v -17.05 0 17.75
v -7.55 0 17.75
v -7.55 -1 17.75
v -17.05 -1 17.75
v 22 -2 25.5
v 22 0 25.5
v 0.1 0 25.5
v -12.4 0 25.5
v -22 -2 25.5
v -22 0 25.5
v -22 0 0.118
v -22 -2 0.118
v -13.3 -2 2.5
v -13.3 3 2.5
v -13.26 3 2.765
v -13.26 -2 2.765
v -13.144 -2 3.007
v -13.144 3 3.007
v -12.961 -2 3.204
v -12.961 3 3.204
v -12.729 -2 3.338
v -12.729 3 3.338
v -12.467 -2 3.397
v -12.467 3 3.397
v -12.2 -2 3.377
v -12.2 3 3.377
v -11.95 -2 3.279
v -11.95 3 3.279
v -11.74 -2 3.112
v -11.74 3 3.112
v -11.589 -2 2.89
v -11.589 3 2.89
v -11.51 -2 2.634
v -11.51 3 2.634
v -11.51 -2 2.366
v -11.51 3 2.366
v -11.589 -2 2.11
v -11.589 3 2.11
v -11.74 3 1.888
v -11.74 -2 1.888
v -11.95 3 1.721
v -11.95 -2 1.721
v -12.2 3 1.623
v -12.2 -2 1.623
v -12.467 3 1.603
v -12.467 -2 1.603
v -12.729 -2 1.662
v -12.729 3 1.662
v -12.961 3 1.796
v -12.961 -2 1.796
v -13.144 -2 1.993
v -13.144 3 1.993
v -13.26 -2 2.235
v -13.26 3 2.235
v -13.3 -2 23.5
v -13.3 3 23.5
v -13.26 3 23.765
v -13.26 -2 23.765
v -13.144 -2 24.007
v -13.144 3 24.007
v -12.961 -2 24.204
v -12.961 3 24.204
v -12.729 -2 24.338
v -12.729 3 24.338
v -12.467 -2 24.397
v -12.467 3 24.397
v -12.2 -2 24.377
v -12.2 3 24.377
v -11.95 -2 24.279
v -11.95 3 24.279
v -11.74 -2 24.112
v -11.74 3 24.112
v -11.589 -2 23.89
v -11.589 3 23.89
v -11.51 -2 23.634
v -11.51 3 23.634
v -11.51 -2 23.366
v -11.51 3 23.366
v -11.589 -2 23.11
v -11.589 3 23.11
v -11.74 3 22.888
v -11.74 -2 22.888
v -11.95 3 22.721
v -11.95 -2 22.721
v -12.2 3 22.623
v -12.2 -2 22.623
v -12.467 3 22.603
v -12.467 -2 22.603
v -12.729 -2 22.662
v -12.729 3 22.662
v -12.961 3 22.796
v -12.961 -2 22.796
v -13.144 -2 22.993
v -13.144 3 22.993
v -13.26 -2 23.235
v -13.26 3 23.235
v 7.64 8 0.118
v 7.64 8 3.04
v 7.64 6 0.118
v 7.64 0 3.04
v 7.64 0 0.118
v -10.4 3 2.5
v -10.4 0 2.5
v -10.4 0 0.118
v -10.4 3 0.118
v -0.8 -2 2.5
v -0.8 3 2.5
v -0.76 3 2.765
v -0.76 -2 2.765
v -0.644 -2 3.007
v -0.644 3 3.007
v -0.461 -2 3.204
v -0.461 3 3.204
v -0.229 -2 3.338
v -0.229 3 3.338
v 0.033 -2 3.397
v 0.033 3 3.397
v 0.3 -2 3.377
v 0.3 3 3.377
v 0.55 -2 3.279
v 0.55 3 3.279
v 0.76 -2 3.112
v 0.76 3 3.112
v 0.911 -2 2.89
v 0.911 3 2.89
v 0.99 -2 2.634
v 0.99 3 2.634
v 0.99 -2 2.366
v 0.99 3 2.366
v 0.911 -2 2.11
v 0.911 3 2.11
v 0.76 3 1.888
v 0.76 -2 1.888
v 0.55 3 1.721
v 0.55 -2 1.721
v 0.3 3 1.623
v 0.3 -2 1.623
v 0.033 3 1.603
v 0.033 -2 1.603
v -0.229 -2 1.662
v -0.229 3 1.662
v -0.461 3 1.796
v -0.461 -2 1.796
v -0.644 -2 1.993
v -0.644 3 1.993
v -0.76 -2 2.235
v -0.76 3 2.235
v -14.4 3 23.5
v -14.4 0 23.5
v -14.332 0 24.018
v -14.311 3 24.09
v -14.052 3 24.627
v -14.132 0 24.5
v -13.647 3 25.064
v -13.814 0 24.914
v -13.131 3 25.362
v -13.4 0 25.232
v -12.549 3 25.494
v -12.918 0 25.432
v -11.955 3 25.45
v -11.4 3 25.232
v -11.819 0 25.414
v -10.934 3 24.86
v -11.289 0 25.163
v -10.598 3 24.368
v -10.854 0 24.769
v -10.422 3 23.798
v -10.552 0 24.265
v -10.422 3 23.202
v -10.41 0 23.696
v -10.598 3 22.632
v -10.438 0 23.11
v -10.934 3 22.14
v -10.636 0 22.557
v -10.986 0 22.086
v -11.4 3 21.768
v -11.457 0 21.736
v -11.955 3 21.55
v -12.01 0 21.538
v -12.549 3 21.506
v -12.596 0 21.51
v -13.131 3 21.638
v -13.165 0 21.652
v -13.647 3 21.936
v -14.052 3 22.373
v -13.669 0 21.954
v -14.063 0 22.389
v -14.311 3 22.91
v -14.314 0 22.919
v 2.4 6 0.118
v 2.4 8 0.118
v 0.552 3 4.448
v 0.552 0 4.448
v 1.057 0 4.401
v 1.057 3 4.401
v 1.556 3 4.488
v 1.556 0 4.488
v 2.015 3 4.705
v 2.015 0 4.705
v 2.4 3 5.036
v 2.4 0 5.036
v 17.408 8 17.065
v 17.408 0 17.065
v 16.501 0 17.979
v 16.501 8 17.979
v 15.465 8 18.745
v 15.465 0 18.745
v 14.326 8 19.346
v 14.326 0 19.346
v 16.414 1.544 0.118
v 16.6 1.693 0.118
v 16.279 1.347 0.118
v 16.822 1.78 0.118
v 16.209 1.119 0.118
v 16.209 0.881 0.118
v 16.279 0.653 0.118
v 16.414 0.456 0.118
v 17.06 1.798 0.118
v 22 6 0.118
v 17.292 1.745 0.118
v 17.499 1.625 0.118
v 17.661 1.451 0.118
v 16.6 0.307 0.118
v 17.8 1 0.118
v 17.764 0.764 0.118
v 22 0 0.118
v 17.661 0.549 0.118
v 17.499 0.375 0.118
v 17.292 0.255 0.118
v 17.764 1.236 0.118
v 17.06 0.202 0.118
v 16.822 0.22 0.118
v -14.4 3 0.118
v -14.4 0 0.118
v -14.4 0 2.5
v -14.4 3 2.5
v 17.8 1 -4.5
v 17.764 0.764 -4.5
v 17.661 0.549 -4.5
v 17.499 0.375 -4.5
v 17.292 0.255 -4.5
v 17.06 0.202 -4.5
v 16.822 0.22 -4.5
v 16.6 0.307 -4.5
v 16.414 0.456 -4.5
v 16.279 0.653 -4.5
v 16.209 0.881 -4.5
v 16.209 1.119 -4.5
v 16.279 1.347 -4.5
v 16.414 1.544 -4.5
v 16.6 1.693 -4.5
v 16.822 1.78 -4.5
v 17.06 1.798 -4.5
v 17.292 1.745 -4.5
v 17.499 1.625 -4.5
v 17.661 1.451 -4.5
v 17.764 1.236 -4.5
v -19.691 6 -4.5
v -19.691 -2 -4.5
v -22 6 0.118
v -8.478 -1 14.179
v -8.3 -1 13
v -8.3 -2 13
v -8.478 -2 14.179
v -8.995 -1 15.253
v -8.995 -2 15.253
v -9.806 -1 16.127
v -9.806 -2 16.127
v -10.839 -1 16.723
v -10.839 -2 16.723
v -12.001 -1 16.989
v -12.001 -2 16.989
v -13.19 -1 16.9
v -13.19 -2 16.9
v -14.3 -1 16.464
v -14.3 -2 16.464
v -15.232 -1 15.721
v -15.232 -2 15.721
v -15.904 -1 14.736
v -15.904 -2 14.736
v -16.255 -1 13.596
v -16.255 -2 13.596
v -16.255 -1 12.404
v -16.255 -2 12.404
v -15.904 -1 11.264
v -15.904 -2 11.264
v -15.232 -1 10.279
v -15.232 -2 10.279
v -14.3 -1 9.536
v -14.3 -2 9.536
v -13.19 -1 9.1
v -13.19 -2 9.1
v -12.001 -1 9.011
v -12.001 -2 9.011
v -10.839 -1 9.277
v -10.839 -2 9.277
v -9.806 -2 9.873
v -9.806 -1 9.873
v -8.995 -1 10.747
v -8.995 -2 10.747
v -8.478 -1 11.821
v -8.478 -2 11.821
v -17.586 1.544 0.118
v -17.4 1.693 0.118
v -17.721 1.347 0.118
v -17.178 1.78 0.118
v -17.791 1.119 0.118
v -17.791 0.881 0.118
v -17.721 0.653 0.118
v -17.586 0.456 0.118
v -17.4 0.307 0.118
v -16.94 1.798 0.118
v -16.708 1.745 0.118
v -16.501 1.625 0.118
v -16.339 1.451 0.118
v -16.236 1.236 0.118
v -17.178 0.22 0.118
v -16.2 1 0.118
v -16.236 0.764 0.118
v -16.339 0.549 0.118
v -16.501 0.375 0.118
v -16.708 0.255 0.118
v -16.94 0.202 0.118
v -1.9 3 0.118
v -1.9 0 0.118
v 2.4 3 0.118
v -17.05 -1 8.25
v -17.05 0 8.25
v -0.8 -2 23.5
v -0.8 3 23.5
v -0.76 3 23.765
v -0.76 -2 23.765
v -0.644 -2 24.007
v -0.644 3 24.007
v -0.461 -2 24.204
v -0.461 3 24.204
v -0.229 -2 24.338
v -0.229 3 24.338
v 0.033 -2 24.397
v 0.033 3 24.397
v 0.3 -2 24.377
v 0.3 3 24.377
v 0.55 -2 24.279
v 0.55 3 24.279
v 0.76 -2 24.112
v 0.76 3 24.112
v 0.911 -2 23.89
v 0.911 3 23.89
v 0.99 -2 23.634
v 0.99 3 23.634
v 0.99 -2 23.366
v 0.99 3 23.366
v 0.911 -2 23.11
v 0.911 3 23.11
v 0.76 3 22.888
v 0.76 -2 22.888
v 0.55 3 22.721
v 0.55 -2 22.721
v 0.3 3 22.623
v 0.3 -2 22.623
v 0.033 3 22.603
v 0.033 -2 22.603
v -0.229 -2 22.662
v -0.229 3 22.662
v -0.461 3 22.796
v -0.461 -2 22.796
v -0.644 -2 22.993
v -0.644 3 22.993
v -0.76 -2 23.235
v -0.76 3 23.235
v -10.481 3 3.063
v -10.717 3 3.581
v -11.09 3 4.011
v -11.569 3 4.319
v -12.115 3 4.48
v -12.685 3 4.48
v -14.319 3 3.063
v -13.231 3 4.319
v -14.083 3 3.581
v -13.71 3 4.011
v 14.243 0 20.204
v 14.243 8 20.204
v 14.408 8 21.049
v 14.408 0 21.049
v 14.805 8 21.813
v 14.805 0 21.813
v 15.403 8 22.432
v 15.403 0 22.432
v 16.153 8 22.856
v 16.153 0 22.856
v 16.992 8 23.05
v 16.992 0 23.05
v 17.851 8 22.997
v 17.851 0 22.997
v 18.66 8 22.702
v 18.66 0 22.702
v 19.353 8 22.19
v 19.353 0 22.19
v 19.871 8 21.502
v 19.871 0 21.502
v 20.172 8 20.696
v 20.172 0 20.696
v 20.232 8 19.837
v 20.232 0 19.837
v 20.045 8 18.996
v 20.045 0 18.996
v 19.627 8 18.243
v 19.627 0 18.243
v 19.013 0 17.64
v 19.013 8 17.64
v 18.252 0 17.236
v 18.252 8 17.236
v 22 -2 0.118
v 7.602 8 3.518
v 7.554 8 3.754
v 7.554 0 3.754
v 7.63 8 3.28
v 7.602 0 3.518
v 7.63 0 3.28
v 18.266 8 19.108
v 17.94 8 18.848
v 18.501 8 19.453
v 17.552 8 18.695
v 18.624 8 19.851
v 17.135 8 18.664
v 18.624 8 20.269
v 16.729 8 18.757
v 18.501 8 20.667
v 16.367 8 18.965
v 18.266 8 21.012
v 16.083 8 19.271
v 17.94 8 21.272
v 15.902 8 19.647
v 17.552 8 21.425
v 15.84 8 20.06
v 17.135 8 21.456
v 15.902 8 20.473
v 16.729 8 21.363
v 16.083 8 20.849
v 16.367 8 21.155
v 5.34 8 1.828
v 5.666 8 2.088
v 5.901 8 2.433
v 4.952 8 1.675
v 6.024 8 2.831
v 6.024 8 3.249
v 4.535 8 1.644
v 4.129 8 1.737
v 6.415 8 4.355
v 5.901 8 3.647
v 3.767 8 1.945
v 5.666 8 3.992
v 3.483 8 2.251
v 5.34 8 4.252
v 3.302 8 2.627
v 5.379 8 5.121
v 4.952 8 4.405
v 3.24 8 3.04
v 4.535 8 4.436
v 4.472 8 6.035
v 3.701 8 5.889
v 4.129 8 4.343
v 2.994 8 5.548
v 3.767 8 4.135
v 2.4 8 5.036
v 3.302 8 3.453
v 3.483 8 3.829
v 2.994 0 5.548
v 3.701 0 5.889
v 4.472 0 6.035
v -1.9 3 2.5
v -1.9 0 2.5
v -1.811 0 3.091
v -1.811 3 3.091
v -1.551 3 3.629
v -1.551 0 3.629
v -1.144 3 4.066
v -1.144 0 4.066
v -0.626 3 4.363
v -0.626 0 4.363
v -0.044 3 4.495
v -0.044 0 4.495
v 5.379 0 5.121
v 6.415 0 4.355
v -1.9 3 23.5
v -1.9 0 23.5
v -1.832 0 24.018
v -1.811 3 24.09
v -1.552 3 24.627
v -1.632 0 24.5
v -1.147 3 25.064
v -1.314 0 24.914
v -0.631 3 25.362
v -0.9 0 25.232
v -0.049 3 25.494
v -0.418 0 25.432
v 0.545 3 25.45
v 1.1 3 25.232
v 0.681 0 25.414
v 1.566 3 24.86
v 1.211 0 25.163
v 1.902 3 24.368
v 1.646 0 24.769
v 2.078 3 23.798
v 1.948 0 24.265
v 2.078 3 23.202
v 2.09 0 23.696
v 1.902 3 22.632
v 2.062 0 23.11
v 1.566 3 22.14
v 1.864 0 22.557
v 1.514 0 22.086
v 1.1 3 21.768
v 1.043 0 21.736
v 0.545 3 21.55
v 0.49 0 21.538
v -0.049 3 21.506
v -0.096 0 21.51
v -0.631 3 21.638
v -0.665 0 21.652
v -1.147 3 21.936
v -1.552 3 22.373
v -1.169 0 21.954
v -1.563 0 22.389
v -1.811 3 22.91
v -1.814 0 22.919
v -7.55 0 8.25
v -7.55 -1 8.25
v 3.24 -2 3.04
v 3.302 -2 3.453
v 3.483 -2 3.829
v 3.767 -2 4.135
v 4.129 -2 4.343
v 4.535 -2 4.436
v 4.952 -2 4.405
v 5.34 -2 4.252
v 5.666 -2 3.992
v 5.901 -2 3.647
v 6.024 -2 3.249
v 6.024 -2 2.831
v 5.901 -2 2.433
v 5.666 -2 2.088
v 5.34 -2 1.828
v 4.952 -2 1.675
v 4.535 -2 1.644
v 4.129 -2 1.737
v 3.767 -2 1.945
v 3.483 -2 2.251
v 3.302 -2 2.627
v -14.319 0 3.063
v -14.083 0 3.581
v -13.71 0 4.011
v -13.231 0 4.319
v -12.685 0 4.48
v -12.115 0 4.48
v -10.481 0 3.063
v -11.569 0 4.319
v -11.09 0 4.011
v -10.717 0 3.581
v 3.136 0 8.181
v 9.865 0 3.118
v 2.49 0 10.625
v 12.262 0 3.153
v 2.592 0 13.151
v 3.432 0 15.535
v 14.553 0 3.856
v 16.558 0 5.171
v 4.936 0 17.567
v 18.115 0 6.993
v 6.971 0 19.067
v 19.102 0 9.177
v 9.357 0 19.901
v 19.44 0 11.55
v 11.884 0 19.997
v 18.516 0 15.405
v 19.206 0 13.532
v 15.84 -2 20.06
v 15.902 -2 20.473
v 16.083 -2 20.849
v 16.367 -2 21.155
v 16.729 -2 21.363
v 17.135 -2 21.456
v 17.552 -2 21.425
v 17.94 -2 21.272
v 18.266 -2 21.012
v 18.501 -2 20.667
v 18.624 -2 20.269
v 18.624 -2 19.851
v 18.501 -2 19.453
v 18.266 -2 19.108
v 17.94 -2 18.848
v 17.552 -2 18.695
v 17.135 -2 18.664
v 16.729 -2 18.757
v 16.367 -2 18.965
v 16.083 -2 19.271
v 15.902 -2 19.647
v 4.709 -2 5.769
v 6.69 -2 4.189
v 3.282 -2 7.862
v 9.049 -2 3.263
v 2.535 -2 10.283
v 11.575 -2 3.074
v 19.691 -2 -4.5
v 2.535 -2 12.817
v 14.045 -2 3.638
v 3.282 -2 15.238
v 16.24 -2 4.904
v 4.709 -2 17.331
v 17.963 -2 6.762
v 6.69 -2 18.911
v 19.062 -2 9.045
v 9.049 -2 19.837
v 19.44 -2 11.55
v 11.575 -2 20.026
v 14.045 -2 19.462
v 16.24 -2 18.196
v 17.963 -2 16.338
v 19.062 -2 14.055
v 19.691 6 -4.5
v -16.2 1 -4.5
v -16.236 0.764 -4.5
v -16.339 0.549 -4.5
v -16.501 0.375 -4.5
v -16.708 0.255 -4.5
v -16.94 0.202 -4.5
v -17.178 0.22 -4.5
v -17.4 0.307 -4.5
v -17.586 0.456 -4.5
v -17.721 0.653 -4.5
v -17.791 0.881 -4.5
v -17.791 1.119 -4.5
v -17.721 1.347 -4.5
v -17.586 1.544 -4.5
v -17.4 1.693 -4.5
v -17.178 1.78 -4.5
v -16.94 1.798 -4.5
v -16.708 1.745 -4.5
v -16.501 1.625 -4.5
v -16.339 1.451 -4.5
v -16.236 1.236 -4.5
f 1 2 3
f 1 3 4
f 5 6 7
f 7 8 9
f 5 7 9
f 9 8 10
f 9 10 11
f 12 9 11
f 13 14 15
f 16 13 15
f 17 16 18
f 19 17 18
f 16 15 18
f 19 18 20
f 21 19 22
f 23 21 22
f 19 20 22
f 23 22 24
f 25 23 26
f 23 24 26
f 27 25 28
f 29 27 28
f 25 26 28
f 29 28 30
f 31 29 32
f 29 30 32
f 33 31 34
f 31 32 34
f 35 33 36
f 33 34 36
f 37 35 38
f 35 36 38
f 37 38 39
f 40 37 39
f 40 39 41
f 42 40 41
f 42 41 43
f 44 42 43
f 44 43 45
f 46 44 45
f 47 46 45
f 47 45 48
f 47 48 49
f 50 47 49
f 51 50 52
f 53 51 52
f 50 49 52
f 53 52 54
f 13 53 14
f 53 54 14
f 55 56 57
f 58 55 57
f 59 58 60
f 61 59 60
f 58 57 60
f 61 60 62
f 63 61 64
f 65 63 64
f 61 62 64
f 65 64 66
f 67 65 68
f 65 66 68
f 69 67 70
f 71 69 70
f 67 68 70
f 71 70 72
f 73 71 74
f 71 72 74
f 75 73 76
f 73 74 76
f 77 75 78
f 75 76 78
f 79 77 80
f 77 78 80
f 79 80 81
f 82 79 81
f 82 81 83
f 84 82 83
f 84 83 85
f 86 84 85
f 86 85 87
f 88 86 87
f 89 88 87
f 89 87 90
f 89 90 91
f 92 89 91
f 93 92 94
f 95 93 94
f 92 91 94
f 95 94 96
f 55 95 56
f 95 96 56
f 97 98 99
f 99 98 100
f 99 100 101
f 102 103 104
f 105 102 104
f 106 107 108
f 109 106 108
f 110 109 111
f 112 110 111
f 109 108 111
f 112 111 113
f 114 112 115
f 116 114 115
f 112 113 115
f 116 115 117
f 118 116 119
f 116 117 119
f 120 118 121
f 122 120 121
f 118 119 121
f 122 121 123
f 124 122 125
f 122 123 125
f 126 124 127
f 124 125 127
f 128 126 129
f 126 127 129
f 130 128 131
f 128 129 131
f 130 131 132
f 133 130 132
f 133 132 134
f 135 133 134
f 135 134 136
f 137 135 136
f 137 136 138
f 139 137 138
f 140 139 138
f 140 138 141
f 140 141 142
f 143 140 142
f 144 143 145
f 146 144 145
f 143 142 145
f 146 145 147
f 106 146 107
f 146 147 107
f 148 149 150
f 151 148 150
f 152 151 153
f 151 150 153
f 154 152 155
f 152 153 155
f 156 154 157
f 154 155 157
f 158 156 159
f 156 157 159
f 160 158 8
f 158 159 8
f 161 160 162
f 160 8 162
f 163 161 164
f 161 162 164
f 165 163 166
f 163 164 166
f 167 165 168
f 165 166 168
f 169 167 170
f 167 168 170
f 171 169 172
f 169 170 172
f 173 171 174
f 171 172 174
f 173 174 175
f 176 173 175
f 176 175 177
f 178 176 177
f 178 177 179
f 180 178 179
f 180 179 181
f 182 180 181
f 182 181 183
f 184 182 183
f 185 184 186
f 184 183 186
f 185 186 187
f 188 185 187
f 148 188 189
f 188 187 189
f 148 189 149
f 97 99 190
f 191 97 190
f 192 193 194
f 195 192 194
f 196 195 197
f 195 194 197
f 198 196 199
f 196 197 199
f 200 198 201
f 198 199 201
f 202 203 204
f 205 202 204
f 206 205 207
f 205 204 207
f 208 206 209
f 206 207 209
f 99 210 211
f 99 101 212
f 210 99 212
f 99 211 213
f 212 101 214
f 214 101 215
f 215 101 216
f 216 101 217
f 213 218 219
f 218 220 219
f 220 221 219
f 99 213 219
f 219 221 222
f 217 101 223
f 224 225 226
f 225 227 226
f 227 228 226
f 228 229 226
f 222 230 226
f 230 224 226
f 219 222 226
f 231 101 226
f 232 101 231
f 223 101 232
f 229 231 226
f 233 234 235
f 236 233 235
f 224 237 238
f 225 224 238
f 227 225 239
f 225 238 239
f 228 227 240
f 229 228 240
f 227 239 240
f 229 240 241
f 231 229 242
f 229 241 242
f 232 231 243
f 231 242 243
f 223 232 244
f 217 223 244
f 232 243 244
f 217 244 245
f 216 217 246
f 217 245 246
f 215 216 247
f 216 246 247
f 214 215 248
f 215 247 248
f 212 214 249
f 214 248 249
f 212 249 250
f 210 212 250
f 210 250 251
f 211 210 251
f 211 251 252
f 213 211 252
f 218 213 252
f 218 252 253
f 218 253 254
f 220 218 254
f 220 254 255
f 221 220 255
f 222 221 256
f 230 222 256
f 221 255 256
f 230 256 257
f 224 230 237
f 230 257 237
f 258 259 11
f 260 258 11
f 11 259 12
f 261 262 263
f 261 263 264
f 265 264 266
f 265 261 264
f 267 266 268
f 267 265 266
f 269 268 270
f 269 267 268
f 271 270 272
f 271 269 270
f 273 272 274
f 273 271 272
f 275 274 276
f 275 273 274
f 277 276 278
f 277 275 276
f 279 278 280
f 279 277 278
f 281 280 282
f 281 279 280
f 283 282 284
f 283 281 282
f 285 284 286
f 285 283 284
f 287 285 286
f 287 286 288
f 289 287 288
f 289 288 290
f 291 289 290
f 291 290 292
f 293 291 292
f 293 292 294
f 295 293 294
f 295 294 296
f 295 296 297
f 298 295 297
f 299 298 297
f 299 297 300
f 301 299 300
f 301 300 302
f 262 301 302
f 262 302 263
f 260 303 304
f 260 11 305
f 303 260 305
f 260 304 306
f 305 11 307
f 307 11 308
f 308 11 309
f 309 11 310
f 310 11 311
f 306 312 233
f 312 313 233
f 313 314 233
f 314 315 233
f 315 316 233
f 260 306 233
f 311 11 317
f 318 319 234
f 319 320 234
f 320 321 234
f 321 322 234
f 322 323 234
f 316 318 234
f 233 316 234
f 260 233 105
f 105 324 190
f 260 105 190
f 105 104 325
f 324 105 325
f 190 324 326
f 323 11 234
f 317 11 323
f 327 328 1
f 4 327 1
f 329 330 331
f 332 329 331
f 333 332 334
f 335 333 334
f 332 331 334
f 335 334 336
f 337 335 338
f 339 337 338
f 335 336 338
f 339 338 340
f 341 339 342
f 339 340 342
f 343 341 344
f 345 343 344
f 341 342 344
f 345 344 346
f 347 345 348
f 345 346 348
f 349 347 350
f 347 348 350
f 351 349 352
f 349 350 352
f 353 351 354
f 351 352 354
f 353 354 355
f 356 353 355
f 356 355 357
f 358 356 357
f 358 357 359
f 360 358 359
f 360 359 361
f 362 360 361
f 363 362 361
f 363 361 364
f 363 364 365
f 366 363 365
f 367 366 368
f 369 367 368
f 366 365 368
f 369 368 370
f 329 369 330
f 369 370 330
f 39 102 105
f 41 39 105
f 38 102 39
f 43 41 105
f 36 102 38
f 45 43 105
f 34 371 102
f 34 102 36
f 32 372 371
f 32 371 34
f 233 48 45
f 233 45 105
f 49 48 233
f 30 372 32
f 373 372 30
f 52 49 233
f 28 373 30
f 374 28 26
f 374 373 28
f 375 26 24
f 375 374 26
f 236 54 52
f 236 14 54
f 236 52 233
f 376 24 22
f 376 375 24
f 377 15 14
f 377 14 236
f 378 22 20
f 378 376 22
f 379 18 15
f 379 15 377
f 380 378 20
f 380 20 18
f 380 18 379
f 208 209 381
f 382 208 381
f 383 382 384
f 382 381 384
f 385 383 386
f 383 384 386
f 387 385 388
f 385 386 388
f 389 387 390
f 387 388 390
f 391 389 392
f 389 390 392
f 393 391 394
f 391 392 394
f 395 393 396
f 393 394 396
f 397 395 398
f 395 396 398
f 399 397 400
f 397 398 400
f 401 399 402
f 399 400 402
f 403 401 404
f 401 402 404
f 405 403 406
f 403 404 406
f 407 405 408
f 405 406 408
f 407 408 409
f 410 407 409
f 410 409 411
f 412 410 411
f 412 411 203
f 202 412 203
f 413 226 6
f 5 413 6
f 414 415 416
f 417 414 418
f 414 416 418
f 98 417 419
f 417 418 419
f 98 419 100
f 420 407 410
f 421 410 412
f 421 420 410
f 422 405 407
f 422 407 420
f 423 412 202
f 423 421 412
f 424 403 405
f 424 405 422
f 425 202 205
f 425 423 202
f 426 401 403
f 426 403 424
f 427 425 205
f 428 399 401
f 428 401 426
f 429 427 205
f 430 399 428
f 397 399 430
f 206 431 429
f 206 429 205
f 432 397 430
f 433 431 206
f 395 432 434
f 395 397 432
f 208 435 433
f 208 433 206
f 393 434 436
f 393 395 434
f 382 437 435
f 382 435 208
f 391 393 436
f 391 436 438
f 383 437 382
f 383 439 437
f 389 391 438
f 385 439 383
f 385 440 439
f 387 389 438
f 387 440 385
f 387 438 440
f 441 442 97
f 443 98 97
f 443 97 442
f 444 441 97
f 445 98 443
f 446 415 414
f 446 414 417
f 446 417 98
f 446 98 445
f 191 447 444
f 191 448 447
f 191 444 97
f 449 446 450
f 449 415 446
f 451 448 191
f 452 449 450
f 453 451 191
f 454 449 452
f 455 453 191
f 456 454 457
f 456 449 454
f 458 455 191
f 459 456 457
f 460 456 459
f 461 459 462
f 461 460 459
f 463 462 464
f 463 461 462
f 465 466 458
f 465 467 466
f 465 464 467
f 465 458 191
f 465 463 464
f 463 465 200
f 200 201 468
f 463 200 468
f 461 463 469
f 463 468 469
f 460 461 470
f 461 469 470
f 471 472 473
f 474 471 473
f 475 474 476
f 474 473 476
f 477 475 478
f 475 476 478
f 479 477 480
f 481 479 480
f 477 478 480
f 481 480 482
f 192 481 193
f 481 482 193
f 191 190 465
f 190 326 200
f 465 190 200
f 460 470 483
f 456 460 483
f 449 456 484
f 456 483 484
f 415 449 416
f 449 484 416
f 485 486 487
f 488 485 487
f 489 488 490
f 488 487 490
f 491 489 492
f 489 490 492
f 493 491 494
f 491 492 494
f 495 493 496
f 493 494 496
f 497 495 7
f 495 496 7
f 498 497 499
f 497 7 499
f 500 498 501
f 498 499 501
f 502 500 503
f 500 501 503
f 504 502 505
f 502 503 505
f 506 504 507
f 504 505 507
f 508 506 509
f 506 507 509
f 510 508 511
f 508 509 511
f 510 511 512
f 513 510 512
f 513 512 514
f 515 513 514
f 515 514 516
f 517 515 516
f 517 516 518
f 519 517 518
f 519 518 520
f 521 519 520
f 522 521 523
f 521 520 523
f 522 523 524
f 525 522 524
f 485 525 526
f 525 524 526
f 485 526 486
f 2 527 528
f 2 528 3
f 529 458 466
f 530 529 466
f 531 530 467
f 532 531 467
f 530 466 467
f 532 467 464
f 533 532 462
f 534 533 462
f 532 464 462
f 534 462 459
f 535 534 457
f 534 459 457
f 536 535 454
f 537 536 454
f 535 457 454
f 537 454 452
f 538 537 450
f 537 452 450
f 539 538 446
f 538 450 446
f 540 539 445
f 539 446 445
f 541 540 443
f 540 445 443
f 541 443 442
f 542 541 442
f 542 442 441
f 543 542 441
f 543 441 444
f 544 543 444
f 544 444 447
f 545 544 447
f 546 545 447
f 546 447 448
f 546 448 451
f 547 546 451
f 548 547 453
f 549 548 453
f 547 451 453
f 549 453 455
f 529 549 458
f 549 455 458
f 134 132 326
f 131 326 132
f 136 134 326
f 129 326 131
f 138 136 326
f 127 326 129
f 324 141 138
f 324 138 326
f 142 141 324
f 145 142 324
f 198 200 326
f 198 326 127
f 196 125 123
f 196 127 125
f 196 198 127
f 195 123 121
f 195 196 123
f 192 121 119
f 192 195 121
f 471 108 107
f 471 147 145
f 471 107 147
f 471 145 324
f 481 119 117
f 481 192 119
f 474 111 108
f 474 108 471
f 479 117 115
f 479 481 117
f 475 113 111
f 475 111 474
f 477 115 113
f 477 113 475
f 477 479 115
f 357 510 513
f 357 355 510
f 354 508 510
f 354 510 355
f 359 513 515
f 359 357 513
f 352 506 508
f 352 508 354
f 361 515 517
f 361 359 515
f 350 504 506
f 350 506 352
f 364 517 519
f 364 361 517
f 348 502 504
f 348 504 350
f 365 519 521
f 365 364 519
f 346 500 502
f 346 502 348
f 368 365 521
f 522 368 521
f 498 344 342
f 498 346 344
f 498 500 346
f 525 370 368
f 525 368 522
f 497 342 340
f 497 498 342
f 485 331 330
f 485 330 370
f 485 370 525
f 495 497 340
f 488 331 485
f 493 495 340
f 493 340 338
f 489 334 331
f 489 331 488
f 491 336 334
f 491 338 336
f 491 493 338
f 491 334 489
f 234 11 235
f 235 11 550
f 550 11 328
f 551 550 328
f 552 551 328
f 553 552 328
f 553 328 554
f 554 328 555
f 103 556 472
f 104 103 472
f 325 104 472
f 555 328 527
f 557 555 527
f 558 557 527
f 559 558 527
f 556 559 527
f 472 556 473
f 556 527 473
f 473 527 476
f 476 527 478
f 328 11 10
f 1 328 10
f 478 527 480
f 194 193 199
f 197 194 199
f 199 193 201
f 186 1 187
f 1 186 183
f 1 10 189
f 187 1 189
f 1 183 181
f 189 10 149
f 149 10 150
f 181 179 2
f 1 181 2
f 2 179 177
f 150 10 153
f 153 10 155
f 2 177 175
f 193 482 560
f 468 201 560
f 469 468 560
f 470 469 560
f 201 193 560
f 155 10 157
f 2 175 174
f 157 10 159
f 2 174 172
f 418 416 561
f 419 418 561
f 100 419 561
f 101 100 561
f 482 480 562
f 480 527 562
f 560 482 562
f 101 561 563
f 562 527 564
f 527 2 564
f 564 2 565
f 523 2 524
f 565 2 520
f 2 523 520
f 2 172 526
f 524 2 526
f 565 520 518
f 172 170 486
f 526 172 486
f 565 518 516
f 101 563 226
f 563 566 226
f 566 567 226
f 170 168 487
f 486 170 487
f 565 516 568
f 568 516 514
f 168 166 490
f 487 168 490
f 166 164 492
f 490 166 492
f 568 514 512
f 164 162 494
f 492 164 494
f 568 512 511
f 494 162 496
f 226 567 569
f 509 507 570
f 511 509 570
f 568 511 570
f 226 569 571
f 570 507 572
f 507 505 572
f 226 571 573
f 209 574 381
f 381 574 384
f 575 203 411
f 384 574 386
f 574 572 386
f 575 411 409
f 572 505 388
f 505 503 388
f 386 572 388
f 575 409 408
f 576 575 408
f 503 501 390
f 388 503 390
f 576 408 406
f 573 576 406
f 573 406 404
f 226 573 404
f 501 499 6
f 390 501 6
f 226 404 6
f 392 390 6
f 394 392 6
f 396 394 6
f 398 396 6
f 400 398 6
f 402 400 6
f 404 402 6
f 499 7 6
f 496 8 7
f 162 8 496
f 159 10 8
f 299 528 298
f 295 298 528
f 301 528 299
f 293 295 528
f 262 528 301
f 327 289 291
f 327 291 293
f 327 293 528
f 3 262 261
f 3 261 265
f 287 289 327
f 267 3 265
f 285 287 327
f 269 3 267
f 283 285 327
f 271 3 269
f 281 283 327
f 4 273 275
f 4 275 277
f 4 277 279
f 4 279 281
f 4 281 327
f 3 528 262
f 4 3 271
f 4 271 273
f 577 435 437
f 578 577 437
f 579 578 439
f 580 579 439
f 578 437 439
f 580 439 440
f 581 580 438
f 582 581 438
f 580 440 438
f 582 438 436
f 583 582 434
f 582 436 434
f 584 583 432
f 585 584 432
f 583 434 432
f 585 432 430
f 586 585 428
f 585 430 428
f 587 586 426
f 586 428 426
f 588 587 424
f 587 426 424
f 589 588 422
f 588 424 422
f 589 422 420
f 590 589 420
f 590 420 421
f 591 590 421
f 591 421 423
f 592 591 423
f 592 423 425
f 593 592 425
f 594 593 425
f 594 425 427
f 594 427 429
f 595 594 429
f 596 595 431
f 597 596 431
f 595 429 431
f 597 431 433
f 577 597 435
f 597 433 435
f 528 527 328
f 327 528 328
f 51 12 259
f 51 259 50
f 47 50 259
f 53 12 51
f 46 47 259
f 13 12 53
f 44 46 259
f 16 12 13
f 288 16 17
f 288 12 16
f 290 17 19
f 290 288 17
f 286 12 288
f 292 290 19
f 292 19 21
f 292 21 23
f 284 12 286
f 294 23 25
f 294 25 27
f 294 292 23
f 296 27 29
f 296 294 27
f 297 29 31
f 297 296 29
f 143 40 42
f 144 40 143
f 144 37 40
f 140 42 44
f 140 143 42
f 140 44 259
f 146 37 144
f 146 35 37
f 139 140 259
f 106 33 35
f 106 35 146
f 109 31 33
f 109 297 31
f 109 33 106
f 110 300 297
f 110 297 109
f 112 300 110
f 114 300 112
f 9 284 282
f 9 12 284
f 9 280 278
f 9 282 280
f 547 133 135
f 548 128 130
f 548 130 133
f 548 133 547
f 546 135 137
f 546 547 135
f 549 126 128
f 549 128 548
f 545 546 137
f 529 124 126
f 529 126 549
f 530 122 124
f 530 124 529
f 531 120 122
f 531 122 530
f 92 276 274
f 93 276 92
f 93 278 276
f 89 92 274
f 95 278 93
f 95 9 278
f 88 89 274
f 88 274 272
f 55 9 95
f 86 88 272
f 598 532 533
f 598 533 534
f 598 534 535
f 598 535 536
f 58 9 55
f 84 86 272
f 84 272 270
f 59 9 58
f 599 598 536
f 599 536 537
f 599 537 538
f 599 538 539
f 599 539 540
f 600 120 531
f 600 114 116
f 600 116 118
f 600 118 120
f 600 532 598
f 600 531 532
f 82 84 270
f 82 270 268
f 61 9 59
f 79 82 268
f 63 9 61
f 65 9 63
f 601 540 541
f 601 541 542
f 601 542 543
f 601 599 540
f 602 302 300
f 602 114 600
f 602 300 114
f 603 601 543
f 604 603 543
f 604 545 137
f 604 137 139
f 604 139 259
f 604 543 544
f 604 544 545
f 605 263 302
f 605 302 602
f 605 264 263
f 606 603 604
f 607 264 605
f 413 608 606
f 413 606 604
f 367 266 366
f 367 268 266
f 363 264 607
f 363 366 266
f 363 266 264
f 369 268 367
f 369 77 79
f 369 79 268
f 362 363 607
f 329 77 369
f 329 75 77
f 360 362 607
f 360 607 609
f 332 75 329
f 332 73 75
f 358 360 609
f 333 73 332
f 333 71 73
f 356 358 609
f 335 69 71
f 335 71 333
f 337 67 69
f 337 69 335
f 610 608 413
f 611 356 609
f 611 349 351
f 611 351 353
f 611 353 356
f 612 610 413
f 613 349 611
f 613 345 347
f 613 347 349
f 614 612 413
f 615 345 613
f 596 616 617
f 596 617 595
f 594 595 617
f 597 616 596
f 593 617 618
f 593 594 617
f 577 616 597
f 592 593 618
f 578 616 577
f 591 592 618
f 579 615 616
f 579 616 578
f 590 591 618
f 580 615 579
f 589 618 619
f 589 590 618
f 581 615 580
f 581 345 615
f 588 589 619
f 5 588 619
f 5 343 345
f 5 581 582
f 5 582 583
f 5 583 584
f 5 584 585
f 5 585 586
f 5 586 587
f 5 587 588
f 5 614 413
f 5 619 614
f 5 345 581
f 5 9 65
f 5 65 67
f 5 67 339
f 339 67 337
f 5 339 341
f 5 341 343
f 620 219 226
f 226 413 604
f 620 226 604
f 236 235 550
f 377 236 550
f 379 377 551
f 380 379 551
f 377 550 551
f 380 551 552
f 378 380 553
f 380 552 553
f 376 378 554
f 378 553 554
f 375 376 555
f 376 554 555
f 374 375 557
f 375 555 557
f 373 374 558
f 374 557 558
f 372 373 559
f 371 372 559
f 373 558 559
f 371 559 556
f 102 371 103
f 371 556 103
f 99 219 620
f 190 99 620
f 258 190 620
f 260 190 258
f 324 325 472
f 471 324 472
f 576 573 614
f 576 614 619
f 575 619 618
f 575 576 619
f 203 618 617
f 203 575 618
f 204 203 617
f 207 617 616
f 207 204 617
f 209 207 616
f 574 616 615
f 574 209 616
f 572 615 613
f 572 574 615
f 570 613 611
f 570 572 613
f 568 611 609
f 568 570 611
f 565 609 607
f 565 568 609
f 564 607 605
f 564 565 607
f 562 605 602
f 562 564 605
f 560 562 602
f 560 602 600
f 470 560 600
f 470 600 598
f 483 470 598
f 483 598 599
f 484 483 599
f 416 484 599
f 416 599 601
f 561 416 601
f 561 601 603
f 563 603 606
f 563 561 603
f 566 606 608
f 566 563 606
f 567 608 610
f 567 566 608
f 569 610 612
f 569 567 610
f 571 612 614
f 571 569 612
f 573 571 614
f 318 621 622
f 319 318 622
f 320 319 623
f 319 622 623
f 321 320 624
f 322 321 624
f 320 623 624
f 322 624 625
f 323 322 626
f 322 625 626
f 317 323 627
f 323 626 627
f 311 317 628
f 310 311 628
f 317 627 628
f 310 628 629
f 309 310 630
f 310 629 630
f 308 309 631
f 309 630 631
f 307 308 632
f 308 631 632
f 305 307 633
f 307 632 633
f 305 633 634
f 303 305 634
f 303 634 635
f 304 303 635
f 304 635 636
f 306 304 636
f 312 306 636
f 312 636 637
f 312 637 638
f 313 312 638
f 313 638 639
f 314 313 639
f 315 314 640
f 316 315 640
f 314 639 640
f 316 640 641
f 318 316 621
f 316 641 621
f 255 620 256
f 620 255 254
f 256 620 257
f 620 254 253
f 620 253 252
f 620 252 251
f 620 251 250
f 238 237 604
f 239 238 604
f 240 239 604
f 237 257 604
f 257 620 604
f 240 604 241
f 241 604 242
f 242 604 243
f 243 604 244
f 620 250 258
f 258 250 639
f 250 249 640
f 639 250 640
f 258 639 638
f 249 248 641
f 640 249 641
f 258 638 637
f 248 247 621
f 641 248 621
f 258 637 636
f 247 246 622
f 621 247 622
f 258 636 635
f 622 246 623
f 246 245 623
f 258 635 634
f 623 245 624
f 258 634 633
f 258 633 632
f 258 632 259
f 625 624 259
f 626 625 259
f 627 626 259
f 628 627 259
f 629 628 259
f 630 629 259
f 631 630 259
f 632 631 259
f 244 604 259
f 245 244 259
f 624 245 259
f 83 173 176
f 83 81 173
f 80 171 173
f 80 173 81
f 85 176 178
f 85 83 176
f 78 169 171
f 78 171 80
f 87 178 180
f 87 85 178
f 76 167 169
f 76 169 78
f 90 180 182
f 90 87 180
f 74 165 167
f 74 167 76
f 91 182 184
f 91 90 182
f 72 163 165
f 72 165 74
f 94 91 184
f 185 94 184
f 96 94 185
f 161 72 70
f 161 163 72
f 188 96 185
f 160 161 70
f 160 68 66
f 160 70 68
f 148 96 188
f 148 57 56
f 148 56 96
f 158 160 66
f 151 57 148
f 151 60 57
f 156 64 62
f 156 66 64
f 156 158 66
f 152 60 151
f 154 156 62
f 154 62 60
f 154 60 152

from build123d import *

# Parameters (mm, degrees)
F1_R      = 4
F1_R_2    = 8.5
F2_DEPTH  = 2
F4_DEPTH  = 6
F5_R      = 0.8
F6_DEPTH  = 4.618034
F8_DEPTH  = 8
F9_R      = 1.4
F10_DEPTH = 10
F11_R     = 2
F12_DEPTH = 3
F13_W     = 9.5
F13_H     = 9.5
F13_R     = 4
F14_DEPTH = 1
F15_R     = 0.9
F16_DEPTH = 5


with BuildPart() as f2:
    # F1 (on Front) → F2 (new body)
    with BuildSketch(Plane.XZ):
        Polygon((-22, 25.5), (-22, 0.118034), (-19.690983, -4.5), (19.690983, -4.5), (22, 0.118034), (22, 25.5), align=None)
        with Locations((-12.3, 13)):
            Circle(F1_R, mode=Mode.SUBTRACT)
        with Locations((10.94, 11.55)):
            Circle(F1_R_2, mode=Mode.SUBTRACT)
    extrude(amount=F2_DEPTH)

    # F3 (on face) → F4 (join)
    with BuildSketch(Plane(origin=(0, 0, 0), x_dir=(-1, 0, 0), z_dir=(0, 1, 0))):
        Polygon((22, 0.118034), (-22, 0.118034), (-19.690983, -4.5), (19.690983, -4.5), align=None)
    extrude(amount=F4_DEPTH)

    # F5 (on face) → F6 (cut, through all)
    with BuildSketch(Plane(origin=(0, 0, -4.5), x_dir=(1, 0, 0), z_dir=(0, 0, -1))):
        with Locations((-17, -1)):
            Circle(F5_R)
        with Locations((17, -1)):
            Circle(F5_R)
    extrude(amount=-F6_DEPTH, mode=Mode.SUBTRACT)

    # F7 (on face) → F8 (join)
    with BuildSketch(Plane(origin=(0, 0, 0), x_dir=(-1, 0, 0), z_dir=(0, 1, 0))):
        with BuildLine():
            ThreePointArc((-17.408219, 17.06472), (-15.997514, 18.381658), (-14.326099, 19.346431))
            ThreePointArc((-14.326099, 19.346431), (-19.025005, 22.471173), (-17.408219, 17.06472))
        make_face()
        with BuildLine():
            ThreePointArc((-4.471781, 6.03528), (-5.882486, 4.718342), (-7.553901, 3.753569))
            ThreePointArc((-7.553901, 3.753569), (-7.618397, 3.399372), (-7.64, 3.04))
            Line((-7.64, 3.04), (-7.64, 0.118034))
            Line((-7.64, 0.118034), (-2.4, 0.118034))
            Line((-2.4, 0.118034), (-2.4, 5.035595))
            ThreePointArc((-2.4, 5.035595), (-3.336266, 5.741903), (-4.471781, 6.03528))
        make_face()
    extrude(amount=F8_DEPTH)

    # F9 (on face) → F10 (cut, through all)
    with BuildSketch(Plane(origin=(0, 8, 0), x_dir=(-1, 0, 0), z_dir=(0, 1, 0))):
        with Locations((-17.24, 20.06)):
            Circle(F9_R)
        with Locations((-4.64, 3.04)):
            Circle(F9_R)
    extrude(amount=-F10_DEPTH, mode=Mode.SUBTRACT)

    # F11 (on face) → F12 (join)
    with BuildSketch(Plane(origin=(0, 0, 0), x_dir=(-1, 0, 0), z_dir=(0, 1, 0))):
        with Locations((-0.1, 23.5)):
            Circle(F11_R)
        with Locations((12.4, 23.5)):
            Circle(F11_R)
        with BuildLine():
            Line((1.9, 0.118034), (1.9, 2.5))
            ThreePointArc((1.9, 2.5), (1.144335, 4.065768), (-0.55163, 4.44834))
            ThreePointArc((-0.55163, 4.44834), (-1.556353, 4.488475), (-2.4, 5.035595))
            Line((-2.4, 5.035595), (-2.4, 0.118034))
            Line((-2.4, 0.118034), (1.9, 0.118034))
        make_face()
        with BuildLine():
            Line((14.4, 0.118034), (14.4, 2.5))
            ThreePointArc((14.4, 2.5), (12.4, 4.5), (10.4, 2.5))
            Line((10.4, 2.5), (10.4, 0.118034))
            Line((10.4, 0.118034), (14.4, 0.118034))
        make_face()
    extrude(amount=F12_DEPTH)

    # F13 (on face) → F14 (cut)
    with BuildSketch(Plane(origin=(0, 0, 0), x_dir=(-1, 0, 0), z_dir=(0, 1, 0))):
        with Locations((12.3, 13)):
            Rectangle(F13_W, F13_H)
        with Locations((12.3, 13)):
            Circle(F13_R, mode=Mode.SUBTRACT)
    extrude(amount=-F14_DEPTH, mode=Mode.SUBTRACT)

    # F15 (on face) → F16 (cut, through all)
    with BuildSketch(Plane(origin=(0, 3, 0), x_dir=(-1, 0, 0), z_dir=(0, 1, 0))):
        with Locations((-0.1, 23.5)):
            Circle(F15_R)
        with Locations((12.4, 23.5)):
            Circle(F15_R)
        with Locations((-0.1, 2.5)):
            Circle(F15_R)
        with Locations((12.4, 2.5)):
            Circle(F15_R)
    extrude(amount=-F16_DEPTH, mode=Mode.SUBTRACT)


solid = f2.part
